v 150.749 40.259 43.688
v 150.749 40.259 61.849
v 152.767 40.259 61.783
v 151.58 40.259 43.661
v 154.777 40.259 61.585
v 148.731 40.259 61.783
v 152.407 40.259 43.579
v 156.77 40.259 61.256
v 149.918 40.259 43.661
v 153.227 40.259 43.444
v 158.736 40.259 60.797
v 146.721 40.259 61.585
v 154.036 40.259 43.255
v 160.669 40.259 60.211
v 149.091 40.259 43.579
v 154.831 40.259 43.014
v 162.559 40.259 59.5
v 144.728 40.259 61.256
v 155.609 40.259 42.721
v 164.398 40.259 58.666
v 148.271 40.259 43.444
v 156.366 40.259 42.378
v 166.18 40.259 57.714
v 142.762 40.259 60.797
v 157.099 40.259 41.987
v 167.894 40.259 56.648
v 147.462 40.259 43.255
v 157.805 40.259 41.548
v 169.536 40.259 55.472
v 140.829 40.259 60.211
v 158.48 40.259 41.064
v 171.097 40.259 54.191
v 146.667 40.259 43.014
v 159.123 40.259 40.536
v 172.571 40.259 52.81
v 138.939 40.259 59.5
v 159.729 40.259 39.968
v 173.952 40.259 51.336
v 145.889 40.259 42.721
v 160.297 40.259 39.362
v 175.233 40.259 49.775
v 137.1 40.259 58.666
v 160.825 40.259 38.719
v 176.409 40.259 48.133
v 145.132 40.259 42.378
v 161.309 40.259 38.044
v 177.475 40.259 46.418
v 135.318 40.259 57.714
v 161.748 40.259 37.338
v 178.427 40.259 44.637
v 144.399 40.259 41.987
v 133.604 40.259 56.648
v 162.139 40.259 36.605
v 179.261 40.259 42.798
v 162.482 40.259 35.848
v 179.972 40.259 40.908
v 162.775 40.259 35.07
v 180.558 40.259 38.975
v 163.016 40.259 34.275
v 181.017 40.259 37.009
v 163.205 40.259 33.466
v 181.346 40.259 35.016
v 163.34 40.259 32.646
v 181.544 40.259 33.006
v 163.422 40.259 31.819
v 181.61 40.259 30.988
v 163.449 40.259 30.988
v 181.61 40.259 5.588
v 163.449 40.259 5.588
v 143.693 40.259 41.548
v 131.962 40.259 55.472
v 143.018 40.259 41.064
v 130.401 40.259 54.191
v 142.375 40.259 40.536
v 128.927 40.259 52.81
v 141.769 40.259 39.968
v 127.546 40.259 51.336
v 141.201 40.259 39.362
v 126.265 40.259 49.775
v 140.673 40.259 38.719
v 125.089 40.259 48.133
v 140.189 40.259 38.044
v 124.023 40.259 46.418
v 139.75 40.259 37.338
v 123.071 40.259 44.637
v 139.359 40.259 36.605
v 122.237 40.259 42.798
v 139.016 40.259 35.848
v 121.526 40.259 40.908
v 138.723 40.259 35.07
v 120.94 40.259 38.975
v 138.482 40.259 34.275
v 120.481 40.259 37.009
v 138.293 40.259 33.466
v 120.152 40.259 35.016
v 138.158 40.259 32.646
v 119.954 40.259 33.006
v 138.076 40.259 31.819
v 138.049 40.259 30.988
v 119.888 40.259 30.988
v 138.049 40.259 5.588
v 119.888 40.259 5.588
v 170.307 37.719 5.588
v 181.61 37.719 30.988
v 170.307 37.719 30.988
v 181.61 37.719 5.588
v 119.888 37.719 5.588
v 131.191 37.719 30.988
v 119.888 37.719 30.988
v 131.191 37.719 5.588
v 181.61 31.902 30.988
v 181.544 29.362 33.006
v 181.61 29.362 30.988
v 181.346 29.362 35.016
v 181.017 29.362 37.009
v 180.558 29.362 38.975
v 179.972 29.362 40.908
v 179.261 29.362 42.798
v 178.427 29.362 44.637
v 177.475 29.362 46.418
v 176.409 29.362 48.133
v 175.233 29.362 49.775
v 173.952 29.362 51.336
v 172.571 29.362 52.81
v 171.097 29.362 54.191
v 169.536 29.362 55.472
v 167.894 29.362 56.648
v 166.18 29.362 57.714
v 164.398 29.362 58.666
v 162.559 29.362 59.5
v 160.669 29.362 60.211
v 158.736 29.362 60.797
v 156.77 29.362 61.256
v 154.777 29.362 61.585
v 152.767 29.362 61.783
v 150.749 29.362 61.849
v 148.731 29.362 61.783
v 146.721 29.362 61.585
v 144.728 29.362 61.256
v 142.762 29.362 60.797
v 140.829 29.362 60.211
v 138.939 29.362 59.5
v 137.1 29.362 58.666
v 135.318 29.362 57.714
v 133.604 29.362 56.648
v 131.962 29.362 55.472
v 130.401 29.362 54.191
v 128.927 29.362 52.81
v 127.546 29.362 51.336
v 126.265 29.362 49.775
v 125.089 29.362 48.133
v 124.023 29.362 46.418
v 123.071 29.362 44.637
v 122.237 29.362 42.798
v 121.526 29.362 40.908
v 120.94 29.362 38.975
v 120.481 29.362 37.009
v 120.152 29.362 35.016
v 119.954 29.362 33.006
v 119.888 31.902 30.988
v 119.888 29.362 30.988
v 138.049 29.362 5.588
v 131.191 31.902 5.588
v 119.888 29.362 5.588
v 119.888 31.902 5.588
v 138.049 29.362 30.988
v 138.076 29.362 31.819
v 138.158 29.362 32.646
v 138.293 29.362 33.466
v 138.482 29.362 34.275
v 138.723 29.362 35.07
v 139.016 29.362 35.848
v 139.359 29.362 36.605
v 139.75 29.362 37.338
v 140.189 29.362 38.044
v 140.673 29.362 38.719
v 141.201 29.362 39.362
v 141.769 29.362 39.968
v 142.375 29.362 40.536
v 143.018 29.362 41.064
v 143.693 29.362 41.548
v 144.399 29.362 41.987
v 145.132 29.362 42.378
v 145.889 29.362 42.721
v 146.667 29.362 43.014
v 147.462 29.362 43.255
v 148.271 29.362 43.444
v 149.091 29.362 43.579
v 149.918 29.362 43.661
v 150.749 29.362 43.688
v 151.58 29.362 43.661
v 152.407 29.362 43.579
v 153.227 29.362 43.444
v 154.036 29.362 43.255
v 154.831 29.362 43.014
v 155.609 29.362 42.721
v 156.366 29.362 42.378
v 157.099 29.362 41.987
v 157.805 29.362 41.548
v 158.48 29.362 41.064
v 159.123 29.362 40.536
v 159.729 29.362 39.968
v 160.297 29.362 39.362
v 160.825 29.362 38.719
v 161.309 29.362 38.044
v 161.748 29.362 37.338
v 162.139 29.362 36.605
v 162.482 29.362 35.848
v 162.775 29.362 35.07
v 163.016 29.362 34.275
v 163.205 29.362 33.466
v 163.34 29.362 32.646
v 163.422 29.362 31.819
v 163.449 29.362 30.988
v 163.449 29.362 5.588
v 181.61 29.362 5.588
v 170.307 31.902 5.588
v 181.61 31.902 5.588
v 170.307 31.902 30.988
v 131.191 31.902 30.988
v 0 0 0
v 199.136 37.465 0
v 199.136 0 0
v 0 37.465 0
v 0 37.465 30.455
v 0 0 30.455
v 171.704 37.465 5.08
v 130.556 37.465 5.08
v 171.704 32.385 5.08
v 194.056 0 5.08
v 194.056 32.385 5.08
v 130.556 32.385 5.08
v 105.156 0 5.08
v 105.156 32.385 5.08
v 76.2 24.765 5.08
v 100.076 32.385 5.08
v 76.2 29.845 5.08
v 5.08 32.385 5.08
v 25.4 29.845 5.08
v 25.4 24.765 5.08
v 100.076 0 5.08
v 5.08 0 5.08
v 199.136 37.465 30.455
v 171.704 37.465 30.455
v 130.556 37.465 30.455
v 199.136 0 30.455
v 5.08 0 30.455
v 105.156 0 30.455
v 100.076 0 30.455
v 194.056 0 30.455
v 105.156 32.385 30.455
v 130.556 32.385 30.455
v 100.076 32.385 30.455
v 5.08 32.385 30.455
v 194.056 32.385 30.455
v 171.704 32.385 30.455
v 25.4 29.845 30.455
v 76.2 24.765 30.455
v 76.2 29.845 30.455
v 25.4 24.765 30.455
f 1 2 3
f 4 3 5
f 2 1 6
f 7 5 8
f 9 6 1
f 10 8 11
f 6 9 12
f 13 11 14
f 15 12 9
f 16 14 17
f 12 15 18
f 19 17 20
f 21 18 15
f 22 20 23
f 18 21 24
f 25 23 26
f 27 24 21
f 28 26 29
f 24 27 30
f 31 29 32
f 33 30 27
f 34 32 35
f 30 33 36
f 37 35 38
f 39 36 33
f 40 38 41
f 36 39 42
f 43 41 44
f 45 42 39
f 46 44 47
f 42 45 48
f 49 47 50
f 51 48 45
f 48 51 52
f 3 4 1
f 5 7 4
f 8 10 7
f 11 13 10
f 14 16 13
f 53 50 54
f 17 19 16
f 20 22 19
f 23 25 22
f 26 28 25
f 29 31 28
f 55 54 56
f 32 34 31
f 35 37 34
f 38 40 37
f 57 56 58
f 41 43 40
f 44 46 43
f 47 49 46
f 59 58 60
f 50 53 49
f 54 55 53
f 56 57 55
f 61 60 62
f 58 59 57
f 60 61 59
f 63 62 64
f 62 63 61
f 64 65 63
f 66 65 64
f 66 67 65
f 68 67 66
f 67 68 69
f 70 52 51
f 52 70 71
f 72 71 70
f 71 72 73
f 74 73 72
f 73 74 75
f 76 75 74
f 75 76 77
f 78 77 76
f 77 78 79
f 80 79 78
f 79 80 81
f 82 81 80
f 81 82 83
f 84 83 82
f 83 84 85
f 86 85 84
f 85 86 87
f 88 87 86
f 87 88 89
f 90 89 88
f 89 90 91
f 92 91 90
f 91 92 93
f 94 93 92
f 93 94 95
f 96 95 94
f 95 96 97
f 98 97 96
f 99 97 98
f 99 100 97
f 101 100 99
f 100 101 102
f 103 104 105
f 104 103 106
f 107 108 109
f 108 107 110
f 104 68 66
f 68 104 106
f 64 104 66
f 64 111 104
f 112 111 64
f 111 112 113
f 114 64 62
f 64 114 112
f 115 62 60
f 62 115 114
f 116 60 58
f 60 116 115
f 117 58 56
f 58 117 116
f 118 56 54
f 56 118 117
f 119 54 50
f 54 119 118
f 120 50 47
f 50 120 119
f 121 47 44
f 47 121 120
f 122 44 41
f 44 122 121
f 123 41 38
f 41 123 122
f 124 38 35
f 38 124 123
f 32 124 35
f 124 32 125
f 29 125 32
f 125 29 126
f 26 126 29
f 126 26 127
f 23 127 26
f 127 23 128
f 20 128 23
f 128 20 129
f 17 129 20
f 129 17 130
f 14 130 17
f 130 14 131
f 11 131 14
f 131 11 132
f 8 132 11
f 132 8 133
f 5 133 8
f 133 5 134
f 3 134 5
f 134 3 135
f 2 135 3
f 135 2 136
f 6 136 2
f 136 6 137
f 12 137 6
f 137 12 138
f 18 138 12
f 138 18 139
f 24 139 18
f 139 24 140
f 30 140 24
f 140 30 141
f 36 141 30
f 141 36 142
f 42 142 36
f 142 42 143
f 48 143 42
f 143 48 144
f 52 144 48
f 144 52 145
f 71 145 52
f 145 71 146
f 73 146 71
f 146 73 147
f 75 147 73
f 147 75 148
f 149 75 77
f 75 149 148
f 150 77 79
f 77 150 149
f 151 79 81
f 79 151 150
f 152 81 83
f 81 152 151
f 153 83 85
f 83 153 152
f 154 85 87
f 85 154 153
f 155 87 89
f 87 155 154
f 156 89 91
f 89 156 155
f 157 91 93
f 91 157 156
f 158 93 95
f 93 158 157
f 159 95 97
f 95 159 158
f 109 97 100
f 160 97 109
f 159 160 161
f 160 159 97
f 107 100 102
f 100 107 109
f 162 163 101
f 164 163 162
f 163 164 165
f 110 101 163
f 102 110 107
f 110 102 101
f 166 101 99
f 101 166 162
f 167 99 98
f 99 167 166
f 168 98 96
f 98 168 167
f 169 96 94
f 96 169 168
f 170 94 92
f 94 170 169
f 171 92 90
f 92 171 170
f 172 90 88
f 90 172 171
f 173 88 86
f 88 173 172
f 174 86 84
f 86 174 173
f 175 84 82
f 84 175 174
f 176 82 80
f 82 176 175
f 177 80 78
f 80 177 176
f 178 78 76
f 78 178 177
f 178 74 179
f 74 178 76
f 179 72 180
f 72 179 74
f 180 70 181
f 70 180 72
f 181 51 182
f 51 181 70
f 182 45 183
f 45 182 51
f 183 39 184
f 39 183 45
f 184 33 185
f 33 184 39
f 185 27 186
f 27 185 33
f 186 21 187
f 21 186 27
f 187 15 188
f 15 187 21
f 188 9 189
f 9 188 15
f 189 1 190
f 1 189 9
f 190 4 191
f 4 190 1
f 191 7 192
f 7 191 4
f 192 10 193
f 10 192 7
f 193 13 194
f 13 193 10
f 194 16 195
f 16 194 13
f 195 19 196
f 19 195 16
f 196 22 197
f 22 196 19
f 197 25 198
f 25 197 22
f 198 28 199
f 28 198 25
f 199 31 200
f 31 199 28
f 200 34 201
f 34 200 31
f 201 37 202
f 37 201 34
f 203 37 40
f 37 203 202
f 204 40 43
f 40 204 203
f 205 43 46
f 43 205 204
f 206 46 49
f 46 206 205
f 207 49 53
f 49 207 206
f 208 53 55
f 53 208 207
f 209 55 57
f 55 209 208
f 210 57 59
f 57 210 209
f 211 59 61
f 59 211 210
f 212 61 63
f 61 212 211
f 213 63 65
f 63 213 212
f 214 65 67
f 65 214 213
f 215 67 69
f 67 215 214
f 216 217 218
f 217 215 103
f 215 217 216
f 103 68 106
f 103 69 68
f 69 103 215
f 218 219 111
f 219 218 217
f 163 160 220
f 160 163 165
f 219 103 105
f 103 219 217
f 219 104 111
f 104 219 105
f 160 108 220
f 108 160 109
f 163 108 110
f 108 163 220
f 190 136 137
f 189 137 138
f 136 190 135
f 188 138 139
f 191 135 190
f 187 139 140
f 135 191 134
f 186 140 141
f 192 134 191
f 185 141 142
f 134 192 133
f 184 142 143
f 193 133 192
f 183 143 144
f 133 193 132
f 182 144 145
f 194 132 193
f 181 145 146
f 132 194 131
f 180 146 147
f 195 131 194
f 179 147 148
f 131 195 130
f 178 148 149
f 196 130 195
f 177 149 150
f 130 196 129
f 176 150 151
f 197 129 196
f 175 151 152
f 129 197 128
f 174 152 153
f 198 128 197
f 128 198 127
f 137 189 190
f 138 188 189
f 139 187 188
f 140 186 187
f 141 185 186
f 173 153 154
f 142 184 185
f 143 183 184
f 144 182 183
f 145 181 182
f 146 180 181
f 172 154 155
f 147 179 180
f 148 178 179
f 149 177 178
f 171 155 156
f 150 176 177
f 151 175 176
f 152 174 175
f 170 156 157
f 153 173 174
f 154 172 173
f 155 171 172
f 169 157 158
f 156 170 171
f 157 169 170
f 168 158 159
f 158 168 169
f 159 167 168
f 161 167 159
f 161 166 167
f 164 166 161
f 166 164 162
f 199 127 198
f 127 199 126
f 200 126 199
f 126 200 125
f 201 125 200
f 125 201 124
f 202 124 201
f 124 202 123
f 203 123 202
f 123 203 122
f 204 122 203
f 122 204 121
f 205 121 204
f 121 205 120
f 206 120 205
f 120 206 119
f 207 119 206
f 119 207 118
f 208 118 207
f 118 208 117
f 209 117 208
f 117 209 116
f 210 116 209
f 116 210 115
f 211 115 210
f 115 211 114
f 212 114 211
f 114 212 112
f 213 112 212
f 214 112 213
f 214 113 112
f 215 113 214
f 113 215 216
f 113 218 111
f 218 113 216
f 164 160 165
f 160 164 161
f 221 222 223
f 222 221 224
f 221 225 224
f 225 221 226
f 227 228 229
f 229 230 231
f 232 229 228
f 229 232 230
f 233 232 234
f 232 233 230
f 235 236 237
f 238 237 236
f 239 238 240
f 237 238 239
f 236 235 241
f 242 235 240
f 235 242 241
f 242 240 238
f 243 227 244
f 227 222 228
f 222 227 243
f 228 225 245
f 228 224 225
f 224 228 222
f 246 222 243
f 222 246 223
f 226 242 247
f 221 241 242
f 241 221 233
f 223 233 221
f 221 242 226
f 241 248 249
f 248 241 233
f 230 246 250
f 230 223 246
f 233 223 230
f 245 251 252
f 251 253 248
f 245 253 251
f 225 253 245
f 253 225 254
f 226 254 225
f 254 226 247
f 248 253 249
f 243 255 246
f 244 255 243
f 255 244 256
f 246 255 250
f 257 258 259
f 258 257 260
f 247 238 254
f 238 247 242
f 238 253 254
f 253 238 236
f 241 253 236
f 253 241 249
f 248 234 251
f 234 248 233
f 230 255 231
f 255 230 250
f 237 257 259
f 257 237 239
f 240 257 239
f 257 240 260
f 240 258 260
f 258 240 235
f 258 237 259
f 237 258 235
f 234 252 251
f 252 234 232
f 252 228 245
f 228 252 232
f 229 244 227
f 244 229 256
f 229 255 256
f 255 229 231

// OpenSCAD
ViewScale = [0.0254, 0.0254, 0.0254];

models=0;
draft=0;

module model_chassis(end=1)
{
    linear_extrude(1000) {
        // chassis sides
        square([65, 1000]);
        translate([65+3580, 0, 0])
        square([65, 1000]);

        if (end) {
            // chassis end
            translate([(3580-3000)/2+65, 1200, 0])
            square([3000, 65]);
        }

        // power supply
        translate([65+3580+65+250, 0, 0])
        square([3430, 1000]);
    }
}

module foot(end=1)
{
    linear_extrude(200)
    if (draft) {
        difference() {
            square([7840, 1475]);
            translate([300, 0, 0])
            square([3500, 1000]);

            translate([4300, 0, 0])
            square([3300, 1000]);
        }
    } else {
        square([7840, 1475]);
    }
    translate([0, 0, 199]) 
    linear_extrude(draft?200: 1000) {
        square([200, 1465]); // left end
        if (end) {
            translate([0, 1465-190, 0]) // back
            square([4140, 200]);
            translate([1000, 1465-190-300, 0]) // back
            square([2000, 200]);
        }
        translate([3940, 0, 0]) 
        square([200, 1465]); // left end

        translate([7790-150, 0, 0]) 
        square([200, 1475]); // right end
    }
    translate([0, 0, 199])
    linear_extrude(draft?200:1000) {
        translate([4140, 1275, 199])
        square([1000, 200]);
        translate([4140+3620-1000, 1275, 199])
        square([1000, 200]);
    }
}

module cap()
{
    outerD=2430;
    innerD=1000;
    module caplayer() {
        intersection() {
            difference() {
                circle(outerD/2, $fn=96);
                circle(innerD/2, $fn=96);
            }
            translate([-2000, 0, 0])
            square([4000, 2000]);
        }
    }
    leglength=1000;
    linear_extrude(100) {
        caplayer();
        translate([innerD/2, -leglength, 0]) square([(outerD-innerD)/2, leglength]);
        translate([-outerD/2, -leglength, 0]) square([(outerD-innerD)/2, leglength]);
    }
    translate([0, 0, 99])
    linear_extrude(230) {
        caplayer();
        translate([(-innerD/2)-270, -leglength, 0])
        square([270, leglength]);
        translate([innerD/2, -leglength, 0])
        square([270, leglength]);
    }
    translate([0, 0, 329])
    linear_extrude(100) {
        caplayer();
        translate([innerD/2, -leglength, 0]) square([(outerD-innerD)/2, leglength]);
        translate([-outerD/2, -leglength, 0]) square([(outerD-innerD)/2, leglength]);
    }

}

module forViewing()
{
    color("green")
    translate([5675+260, 1475+110, 1220])
    rotate([90, 0, 0])
    cap();

    if(models) translate([210, 0, 210]) color("cyan") model_chassis();
//    translate([-210, 0, 0])
    foot();
*    translate([0, -1000, 0]) scale([1.0, -1.0, 1.0]) foot(0);
*    translate([0, -3000, 0]) scale([1.0, -1.0, 1.0]) foot();

}

module forPrinting()
{
    foot();
}

scale(ViewScale)
{
    forViewing();
//    forPrinting();
}
